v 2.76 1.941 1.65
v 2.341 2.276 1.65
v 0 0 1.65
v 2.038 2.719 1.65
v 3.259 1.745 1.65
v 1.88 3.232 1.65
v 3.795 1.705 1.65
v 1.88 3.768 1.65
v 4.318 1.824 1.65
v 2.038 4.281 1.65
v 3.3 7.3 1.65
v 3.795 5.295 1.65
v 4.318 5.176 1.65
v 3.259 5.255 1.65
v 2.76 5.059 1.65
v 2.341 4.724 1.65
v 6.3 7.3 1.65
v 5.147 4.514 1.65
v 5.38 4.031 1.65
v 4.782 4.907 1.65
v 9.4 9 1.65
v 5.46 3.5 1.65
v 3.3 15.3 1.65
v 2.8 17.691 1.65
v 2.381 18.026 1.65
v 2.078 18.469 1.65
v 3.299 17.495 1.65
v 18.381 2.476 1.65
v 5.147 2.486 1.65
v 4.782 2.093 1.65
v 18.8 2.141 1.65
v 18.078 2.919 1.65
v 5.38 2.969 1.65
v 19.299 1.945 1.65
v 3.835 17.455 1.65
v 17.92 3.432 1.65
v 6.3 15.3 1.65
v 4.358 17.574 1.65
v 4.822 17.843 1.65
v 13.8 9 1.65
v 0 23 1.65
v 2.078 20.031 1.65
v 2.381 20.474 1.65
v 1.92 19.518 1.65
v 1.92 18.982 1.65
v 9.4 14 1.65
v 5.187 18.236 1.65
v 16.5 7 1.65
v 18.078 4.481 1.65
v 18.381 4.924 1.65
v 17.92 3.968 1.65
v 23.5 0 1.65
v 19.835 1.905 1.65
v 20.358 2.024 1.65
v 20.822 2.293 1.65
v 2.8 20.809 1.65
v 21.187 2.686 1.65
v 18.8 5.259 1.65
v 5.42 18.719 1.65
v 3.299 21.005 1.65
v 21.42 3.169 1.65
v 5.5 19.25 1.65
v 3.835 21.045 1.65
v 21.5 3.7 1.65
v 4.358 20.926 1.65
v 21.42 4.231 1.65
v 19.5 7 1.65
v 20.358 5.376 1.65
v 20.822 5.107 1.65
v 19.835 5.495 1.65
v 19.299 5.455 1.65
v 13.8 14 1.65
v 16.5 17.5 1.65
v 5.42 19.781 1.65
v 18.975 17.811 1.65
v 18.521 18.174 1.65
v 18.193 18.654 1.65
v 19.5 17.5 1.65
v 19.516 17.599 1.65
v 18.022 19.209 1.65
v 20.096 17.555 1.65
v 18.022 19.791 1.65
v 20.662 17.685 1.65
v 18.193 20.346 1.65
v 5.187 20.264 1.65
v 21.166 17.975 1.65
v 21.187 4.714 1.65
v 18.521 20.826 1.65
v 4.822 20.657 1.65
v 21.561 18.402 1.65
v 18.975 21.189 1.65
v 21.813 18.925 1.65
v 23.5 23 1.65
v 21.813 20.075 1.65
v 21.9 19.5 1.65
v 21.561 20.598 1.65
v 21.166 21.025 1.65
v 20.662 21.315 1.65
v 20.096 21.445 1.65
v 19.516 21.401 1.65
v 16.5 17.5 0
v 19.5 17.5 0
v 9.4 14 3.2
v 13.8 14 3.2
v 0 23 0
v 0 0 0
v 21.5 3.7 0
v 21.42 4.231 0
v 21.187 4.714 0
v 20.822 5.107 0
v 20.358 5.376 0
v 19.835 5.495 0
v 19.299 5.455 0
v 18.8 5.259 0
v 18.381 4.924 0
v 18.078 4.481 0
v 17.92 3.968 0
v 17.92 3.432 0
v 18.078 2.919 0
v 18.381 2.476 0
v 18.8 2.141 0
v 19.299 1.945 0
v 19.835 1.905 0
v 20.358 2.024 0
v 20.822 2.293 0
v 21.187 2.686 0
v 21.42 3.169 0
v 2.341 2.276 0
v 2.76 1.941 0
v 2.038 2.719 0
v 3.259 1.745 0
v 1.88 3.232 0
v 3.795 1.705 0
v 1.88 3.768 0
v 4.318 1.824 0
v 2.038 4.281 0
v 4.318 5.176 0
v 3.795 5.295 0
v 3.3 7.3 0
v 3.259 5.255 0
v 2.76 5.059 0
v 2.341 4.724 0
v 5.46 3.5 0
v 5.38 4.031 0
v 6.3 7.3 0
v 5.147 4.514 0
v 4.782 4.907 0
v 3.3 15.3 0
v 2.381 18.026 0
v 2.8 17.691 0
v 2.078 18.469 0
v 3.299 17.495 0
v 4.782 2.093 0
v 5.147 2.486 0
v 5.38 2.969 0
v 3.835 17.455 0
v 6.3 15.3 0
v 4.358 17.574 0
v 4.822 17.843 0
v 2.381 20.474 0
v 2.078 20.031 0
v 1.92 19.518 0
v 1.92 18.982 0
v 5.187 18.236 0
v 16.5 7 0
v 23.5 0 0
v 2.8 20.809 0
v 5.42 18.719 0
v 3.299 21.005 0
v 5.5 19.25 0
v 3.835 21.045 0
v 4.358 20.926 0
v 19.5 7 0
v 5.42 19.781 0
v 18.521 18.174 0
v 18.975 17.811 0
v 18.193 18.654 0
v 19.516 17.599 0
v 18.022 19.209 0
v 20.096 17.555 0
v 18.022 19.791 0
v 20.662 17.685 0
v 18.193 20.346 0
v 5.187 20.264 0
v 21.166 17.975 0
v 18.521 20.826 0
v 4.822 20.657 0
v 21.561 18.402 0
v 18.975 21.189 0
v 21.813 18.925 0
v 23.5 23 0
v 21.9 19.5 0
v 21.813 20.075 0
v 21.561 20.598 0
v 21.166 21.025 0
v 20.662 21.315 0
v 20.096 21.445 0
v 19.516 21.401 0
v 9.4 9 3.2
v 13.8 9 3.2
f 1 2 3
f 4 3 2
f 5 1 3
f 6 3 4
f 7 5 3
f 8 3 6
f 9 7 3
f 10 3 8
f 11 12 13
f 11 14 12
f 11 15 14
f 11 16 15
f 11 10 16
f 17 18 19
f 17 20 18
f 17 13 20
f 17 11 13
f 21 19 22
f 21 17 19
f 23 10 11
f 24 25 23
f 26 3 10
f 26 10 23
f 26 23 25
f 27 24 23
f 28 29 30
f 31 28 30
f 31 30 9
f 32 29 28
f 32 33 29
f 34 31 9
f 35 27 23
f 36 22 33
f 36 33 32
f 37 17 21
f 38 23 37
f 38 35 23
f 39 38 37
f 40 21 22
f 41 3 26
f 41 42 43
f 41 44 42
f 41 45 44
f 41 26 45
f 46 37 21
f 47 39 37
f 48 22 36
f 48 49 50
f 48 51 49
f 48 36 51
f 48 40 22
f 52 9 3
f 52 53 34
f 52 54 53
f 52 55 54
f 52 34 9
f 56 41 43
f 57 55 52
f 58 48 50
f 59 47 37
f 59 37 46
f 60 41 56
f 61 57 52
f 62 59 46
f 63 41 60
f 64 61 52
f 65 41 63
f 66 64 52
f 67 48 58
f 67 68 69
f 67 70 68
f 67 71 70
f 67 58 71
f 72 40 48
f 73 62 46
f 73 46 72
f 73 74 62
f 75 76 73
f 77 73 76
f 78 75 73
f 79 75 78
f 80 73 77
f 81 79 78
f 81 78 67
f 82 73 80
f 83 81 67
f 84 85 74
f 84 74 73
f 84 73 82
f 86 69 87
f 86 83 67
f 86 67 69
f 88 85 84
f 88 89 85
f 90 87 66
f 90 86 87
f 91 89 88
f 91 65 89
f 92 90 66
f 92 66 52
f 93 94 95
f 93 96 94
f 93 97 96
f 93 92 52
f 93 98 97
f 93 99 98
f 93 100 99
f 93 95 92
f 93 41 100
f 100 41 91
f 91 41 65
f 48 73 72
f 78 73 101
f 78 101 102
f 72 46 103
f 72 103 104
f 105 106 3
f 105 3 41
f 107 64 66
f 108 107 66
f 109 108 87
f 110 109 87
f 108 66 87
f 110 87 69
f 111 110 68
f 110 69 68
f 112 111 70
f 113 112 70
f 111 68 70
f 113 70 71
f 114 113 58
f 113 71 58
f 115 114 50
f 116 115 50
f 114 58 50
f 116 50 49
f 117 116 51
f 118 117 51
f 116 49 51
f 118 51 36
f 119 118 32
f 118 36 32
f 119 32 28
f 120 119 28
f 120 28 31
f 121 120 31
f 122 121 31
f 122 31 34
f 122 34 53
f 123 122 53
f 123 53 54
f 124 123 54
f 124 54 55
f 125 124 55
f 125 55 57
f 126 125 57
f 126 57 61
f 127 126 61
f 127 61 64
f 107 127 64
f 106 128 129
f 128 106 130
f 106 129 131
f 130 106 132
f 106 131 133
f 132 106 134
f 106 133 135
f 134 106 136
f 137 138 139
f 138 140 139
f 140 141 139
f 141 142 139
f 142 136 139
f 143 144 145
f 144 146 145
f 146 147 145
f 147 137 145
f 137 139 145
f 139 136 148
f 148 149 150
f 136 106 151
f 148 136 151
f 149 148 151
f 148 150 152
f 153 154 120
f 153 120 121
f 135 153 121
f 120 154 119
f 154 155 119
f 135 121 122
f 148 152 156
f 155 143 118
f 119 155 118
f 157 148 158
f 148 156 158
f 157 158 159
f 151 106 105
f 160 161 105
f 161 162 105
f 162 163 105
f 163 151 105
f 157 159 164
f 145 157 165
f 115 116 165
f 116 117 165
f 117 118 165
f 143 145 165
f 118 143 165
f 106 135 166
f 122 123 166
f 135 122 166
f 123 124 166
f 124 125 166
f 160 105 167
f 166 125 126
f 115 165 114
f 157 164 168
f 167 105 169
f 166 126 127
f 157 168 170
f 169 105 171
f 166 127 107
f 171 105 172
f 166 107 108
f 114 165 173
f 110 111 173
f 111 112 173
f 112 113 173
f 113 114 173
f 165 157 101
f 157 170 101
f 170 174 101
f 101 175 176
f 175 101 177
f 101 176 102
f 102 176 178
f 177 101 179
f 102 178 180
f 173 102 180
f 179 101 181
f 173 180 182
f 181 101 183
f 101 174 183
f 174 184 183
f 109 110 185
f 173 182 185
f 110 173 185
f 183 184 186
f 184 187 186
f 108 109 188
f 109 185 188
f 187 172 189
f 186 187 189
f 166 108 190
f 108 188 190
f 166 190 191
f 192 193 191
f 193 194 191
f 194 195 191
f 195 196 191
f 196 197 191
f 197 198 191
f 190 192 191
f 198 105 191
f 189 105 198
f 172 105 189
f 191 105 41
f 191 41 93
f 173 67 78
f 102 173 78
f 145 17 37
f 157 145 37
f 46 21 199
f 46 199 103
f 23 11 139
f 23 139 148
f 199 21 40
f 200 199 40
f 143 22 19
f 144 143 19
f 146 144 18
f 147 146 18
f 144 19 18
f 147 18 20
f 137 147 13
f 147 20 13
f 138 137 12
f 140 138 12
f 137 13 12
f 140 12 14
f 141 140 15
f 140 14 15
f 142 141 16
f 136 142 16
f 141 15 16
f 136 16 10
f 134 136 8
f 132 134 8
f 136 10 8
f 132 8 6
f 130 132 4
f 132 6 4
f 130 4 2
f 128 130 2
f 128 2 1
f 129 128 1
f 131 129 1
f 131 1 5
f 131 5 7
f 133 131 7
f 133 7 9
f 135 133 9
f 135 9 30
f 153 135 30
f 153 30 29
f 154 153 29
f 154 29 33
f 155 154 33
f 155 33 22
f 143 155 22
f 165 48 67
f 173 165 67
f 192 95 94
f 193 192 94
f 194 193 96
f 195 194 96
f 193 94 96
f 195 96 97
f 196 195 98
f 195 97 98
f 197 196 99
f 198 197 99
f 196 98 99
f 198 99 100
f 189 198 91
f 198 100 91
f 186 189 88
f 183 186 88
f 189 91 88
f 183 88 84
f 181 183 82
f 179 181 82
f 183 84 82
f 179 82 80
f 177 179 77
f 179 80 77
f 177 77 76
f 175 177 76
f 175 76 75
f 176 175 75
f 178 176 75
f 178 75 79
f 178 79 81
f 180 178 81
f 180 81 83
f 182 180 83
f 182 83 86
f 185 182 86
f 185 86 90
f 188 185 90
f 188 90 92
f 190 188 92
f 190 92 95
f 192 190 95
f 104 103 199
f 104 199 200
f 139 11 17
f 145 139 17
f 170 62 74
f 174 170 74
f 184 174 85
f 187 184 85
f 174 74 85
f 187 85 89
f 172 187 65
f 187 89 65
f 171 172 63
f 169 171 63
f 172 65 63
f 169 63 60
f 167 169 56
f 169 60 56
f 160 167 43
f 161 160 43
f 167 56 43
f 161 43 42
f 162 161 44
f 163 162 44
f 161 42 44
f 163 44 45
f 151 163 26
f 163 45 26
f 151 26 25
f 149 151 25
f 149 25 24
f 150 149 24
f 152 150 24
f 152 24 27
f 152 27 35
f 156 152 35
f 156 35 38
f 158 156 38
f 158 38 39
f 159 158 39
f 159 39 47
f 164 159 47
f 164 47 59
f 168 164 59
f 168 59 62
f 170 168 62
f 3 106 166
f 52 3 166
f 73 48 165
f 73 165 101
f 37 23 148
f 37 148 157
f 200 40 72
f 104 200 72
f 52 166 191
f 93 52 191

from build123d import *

# Parameters (mm, degrees)
SKETCH1_W           = 23.5
SKETCH1_H           = 23
BOSS_EXTRUDE1_DEPTH = 1.65
SKETCH2_W           = 4.4
SKETCH2_H           = 5
BOSS_EXTRUDE2_DEPTH = 1.55
CUT_EXTRUDE1_REACH  = 34.924
SKETCH3_W           = 3
SKETCH3_H           = 10.5
CUT_EXTRUDE2_REACH  = 34.924
SKETCH4_W           = 3
SKETCH4_H           = 8
CUT_EXTRUDE3_REACH  = 34.924
SKETCH5_R           = 1.8
SKETCH5_R_2         = 1.95


with BuildPart() as part:
    # Sketch1 → Boss-Extrude1 (new body)
    with BuildSketch(Plane.XY):
        with Locations((11.75, 11.5)):
            Rectangle(SKETCH1_W, SKETCH1_H)
    extrude(amount=BOSS_EXTRUDE1_DEPTH)

    # Sketch2 → Boss-Extrude2 (add)
    with BuildSketch(Plane.XY.offset(1.65)):
        with Locations((11.6, 11.5)):
            Rectangle(SKETCH2_W, SKETCH2_H)
    extrude(amount=BOSS_EXTRUDE2_DEPTH)

    # Sketch3 → Cut-Extrude1 (cut, up to next)
    with BuildSketch(Plane.XY.offset(1.65), mode=Mode.PRIVATE) as cut_extrude1_sk1:
        with Locations((18, 12.25)):
            Rectangle(SKETCH3_W, SKETCH3_H)
    cut_extrude1_tool1 = extrude(cut_extrude1_sk1.sketch, amount=-CUT_EXTRUDE1_REACH, mode=Mode.PRIVATE) & part.part
    add(cut_extrude1_tool1.solids().sort_by_distance((18, 12.25, 1.65))[0], mode=Mode.SUBTRACT)

    # Sketch4 → Cut-Extrude2 (cut, up to next)
    with BuildSketch(Plane.XY.offset(1.65), mode=Mode.PRIVATE) as cut_extrude2_sk1:
        with Locations((4.8, 11.3)):
            Rectangle(SKETCH4_W, SKETCH4_H)
    cut_extrude2_tool1 = extrude(cut_extrude2_sk1.sketch, amount=-CUT_EXTRUDE2_REACH, mode=Mode.PRIVATE) & part.part
    add(cut_extrude2_tool1.solids().sort_by_distance((4.8, 11.3, 1.65))[0], mode=Mode.SUBTRACT)

    # Sketch5 → Cut-Extrude3 (cut, up to next)
    with BuildSketch(Plane.XY.offset(1.65), mode=Mode.PRIVATE) as cut_extrude3_sk1:
        with Locations((3.7, 19.25)):
            Circle(SKETCH5_R)
    cut_extrude3_tool1 = extrude(cut_extrude3_sk1.sketch, amount=-CUT_EXTRUDE3_REACH, mode=Mode.PRIVATE) & part.part
    # Sketch5 → Cut-Extrude3 (cut, up to next)
    with BuildSketch(Plane.XY.offset(1.65), mode=Mode.PRIVATE) as cut_extrude3_sk2:
        with Locations((19.95, 19.5)):
            Circle(SKETCH5_R_2)
    cut_extrude3_tool2 = extrude(cut_extrude3_sk2.sketch, amount=-CUT_EXTRUDE3_REACH, mode=Mode.PRIVATE) & part.part
    # Sketch5 → Cut-Extrude3 (cut, up to next)
    with BuildSketch(Plane.XY.offset(1.65), mode=Mode.PRIVATE) as cut_extrude3_sk3:
        with Locations((19.7, 3.7)):
            Circle(SKETCH5_R)
    cut_extrude3_tool3 = extrude(cut_extrude3_sk3.sketch, amount=-CUT_EXTRUDE3_REACH, mode=Mode.PRIVATE) & part.part
    # Sketch5 → Cut-Extrude3 (cut, up to next)
    with BuildSketch(Plane.XY.offset(1.65), mode=Mode.PRIVATE) as cut_extrude3_sk4:
        with Locations((3.66, 3.5)):
            Circle(SKETCH5_R)
    cut_extrude3_tool4 = extrude(cut_extrude3_sk4.sketch, amount=-CUT_EXTRUDE3_REACH, mode=Mode.PRIVATE) & part.part
    add(cut_extrude3_tool1.solids().sort_by_distance((3.7, 19.25, 1.65))[0], mode=Mode.SUBTRACT)
    add(cut_extrude3_tool2.solids().sort_by_distance((19.95, 19.5, 1.65))[0], mode=Mode.SUBTRACT)
    add(cut_extrude3_tool3.solids().sort_by_distance((19.7, 3.7, 1.65))[0], mode=Mode.SUBTRACT)
    add(cut_extrude3_tool4.solids().sort_by_distance((3.66, 3.5, 1.65))[0], mode=Mode.SUBTRACT)


solid = part.part
